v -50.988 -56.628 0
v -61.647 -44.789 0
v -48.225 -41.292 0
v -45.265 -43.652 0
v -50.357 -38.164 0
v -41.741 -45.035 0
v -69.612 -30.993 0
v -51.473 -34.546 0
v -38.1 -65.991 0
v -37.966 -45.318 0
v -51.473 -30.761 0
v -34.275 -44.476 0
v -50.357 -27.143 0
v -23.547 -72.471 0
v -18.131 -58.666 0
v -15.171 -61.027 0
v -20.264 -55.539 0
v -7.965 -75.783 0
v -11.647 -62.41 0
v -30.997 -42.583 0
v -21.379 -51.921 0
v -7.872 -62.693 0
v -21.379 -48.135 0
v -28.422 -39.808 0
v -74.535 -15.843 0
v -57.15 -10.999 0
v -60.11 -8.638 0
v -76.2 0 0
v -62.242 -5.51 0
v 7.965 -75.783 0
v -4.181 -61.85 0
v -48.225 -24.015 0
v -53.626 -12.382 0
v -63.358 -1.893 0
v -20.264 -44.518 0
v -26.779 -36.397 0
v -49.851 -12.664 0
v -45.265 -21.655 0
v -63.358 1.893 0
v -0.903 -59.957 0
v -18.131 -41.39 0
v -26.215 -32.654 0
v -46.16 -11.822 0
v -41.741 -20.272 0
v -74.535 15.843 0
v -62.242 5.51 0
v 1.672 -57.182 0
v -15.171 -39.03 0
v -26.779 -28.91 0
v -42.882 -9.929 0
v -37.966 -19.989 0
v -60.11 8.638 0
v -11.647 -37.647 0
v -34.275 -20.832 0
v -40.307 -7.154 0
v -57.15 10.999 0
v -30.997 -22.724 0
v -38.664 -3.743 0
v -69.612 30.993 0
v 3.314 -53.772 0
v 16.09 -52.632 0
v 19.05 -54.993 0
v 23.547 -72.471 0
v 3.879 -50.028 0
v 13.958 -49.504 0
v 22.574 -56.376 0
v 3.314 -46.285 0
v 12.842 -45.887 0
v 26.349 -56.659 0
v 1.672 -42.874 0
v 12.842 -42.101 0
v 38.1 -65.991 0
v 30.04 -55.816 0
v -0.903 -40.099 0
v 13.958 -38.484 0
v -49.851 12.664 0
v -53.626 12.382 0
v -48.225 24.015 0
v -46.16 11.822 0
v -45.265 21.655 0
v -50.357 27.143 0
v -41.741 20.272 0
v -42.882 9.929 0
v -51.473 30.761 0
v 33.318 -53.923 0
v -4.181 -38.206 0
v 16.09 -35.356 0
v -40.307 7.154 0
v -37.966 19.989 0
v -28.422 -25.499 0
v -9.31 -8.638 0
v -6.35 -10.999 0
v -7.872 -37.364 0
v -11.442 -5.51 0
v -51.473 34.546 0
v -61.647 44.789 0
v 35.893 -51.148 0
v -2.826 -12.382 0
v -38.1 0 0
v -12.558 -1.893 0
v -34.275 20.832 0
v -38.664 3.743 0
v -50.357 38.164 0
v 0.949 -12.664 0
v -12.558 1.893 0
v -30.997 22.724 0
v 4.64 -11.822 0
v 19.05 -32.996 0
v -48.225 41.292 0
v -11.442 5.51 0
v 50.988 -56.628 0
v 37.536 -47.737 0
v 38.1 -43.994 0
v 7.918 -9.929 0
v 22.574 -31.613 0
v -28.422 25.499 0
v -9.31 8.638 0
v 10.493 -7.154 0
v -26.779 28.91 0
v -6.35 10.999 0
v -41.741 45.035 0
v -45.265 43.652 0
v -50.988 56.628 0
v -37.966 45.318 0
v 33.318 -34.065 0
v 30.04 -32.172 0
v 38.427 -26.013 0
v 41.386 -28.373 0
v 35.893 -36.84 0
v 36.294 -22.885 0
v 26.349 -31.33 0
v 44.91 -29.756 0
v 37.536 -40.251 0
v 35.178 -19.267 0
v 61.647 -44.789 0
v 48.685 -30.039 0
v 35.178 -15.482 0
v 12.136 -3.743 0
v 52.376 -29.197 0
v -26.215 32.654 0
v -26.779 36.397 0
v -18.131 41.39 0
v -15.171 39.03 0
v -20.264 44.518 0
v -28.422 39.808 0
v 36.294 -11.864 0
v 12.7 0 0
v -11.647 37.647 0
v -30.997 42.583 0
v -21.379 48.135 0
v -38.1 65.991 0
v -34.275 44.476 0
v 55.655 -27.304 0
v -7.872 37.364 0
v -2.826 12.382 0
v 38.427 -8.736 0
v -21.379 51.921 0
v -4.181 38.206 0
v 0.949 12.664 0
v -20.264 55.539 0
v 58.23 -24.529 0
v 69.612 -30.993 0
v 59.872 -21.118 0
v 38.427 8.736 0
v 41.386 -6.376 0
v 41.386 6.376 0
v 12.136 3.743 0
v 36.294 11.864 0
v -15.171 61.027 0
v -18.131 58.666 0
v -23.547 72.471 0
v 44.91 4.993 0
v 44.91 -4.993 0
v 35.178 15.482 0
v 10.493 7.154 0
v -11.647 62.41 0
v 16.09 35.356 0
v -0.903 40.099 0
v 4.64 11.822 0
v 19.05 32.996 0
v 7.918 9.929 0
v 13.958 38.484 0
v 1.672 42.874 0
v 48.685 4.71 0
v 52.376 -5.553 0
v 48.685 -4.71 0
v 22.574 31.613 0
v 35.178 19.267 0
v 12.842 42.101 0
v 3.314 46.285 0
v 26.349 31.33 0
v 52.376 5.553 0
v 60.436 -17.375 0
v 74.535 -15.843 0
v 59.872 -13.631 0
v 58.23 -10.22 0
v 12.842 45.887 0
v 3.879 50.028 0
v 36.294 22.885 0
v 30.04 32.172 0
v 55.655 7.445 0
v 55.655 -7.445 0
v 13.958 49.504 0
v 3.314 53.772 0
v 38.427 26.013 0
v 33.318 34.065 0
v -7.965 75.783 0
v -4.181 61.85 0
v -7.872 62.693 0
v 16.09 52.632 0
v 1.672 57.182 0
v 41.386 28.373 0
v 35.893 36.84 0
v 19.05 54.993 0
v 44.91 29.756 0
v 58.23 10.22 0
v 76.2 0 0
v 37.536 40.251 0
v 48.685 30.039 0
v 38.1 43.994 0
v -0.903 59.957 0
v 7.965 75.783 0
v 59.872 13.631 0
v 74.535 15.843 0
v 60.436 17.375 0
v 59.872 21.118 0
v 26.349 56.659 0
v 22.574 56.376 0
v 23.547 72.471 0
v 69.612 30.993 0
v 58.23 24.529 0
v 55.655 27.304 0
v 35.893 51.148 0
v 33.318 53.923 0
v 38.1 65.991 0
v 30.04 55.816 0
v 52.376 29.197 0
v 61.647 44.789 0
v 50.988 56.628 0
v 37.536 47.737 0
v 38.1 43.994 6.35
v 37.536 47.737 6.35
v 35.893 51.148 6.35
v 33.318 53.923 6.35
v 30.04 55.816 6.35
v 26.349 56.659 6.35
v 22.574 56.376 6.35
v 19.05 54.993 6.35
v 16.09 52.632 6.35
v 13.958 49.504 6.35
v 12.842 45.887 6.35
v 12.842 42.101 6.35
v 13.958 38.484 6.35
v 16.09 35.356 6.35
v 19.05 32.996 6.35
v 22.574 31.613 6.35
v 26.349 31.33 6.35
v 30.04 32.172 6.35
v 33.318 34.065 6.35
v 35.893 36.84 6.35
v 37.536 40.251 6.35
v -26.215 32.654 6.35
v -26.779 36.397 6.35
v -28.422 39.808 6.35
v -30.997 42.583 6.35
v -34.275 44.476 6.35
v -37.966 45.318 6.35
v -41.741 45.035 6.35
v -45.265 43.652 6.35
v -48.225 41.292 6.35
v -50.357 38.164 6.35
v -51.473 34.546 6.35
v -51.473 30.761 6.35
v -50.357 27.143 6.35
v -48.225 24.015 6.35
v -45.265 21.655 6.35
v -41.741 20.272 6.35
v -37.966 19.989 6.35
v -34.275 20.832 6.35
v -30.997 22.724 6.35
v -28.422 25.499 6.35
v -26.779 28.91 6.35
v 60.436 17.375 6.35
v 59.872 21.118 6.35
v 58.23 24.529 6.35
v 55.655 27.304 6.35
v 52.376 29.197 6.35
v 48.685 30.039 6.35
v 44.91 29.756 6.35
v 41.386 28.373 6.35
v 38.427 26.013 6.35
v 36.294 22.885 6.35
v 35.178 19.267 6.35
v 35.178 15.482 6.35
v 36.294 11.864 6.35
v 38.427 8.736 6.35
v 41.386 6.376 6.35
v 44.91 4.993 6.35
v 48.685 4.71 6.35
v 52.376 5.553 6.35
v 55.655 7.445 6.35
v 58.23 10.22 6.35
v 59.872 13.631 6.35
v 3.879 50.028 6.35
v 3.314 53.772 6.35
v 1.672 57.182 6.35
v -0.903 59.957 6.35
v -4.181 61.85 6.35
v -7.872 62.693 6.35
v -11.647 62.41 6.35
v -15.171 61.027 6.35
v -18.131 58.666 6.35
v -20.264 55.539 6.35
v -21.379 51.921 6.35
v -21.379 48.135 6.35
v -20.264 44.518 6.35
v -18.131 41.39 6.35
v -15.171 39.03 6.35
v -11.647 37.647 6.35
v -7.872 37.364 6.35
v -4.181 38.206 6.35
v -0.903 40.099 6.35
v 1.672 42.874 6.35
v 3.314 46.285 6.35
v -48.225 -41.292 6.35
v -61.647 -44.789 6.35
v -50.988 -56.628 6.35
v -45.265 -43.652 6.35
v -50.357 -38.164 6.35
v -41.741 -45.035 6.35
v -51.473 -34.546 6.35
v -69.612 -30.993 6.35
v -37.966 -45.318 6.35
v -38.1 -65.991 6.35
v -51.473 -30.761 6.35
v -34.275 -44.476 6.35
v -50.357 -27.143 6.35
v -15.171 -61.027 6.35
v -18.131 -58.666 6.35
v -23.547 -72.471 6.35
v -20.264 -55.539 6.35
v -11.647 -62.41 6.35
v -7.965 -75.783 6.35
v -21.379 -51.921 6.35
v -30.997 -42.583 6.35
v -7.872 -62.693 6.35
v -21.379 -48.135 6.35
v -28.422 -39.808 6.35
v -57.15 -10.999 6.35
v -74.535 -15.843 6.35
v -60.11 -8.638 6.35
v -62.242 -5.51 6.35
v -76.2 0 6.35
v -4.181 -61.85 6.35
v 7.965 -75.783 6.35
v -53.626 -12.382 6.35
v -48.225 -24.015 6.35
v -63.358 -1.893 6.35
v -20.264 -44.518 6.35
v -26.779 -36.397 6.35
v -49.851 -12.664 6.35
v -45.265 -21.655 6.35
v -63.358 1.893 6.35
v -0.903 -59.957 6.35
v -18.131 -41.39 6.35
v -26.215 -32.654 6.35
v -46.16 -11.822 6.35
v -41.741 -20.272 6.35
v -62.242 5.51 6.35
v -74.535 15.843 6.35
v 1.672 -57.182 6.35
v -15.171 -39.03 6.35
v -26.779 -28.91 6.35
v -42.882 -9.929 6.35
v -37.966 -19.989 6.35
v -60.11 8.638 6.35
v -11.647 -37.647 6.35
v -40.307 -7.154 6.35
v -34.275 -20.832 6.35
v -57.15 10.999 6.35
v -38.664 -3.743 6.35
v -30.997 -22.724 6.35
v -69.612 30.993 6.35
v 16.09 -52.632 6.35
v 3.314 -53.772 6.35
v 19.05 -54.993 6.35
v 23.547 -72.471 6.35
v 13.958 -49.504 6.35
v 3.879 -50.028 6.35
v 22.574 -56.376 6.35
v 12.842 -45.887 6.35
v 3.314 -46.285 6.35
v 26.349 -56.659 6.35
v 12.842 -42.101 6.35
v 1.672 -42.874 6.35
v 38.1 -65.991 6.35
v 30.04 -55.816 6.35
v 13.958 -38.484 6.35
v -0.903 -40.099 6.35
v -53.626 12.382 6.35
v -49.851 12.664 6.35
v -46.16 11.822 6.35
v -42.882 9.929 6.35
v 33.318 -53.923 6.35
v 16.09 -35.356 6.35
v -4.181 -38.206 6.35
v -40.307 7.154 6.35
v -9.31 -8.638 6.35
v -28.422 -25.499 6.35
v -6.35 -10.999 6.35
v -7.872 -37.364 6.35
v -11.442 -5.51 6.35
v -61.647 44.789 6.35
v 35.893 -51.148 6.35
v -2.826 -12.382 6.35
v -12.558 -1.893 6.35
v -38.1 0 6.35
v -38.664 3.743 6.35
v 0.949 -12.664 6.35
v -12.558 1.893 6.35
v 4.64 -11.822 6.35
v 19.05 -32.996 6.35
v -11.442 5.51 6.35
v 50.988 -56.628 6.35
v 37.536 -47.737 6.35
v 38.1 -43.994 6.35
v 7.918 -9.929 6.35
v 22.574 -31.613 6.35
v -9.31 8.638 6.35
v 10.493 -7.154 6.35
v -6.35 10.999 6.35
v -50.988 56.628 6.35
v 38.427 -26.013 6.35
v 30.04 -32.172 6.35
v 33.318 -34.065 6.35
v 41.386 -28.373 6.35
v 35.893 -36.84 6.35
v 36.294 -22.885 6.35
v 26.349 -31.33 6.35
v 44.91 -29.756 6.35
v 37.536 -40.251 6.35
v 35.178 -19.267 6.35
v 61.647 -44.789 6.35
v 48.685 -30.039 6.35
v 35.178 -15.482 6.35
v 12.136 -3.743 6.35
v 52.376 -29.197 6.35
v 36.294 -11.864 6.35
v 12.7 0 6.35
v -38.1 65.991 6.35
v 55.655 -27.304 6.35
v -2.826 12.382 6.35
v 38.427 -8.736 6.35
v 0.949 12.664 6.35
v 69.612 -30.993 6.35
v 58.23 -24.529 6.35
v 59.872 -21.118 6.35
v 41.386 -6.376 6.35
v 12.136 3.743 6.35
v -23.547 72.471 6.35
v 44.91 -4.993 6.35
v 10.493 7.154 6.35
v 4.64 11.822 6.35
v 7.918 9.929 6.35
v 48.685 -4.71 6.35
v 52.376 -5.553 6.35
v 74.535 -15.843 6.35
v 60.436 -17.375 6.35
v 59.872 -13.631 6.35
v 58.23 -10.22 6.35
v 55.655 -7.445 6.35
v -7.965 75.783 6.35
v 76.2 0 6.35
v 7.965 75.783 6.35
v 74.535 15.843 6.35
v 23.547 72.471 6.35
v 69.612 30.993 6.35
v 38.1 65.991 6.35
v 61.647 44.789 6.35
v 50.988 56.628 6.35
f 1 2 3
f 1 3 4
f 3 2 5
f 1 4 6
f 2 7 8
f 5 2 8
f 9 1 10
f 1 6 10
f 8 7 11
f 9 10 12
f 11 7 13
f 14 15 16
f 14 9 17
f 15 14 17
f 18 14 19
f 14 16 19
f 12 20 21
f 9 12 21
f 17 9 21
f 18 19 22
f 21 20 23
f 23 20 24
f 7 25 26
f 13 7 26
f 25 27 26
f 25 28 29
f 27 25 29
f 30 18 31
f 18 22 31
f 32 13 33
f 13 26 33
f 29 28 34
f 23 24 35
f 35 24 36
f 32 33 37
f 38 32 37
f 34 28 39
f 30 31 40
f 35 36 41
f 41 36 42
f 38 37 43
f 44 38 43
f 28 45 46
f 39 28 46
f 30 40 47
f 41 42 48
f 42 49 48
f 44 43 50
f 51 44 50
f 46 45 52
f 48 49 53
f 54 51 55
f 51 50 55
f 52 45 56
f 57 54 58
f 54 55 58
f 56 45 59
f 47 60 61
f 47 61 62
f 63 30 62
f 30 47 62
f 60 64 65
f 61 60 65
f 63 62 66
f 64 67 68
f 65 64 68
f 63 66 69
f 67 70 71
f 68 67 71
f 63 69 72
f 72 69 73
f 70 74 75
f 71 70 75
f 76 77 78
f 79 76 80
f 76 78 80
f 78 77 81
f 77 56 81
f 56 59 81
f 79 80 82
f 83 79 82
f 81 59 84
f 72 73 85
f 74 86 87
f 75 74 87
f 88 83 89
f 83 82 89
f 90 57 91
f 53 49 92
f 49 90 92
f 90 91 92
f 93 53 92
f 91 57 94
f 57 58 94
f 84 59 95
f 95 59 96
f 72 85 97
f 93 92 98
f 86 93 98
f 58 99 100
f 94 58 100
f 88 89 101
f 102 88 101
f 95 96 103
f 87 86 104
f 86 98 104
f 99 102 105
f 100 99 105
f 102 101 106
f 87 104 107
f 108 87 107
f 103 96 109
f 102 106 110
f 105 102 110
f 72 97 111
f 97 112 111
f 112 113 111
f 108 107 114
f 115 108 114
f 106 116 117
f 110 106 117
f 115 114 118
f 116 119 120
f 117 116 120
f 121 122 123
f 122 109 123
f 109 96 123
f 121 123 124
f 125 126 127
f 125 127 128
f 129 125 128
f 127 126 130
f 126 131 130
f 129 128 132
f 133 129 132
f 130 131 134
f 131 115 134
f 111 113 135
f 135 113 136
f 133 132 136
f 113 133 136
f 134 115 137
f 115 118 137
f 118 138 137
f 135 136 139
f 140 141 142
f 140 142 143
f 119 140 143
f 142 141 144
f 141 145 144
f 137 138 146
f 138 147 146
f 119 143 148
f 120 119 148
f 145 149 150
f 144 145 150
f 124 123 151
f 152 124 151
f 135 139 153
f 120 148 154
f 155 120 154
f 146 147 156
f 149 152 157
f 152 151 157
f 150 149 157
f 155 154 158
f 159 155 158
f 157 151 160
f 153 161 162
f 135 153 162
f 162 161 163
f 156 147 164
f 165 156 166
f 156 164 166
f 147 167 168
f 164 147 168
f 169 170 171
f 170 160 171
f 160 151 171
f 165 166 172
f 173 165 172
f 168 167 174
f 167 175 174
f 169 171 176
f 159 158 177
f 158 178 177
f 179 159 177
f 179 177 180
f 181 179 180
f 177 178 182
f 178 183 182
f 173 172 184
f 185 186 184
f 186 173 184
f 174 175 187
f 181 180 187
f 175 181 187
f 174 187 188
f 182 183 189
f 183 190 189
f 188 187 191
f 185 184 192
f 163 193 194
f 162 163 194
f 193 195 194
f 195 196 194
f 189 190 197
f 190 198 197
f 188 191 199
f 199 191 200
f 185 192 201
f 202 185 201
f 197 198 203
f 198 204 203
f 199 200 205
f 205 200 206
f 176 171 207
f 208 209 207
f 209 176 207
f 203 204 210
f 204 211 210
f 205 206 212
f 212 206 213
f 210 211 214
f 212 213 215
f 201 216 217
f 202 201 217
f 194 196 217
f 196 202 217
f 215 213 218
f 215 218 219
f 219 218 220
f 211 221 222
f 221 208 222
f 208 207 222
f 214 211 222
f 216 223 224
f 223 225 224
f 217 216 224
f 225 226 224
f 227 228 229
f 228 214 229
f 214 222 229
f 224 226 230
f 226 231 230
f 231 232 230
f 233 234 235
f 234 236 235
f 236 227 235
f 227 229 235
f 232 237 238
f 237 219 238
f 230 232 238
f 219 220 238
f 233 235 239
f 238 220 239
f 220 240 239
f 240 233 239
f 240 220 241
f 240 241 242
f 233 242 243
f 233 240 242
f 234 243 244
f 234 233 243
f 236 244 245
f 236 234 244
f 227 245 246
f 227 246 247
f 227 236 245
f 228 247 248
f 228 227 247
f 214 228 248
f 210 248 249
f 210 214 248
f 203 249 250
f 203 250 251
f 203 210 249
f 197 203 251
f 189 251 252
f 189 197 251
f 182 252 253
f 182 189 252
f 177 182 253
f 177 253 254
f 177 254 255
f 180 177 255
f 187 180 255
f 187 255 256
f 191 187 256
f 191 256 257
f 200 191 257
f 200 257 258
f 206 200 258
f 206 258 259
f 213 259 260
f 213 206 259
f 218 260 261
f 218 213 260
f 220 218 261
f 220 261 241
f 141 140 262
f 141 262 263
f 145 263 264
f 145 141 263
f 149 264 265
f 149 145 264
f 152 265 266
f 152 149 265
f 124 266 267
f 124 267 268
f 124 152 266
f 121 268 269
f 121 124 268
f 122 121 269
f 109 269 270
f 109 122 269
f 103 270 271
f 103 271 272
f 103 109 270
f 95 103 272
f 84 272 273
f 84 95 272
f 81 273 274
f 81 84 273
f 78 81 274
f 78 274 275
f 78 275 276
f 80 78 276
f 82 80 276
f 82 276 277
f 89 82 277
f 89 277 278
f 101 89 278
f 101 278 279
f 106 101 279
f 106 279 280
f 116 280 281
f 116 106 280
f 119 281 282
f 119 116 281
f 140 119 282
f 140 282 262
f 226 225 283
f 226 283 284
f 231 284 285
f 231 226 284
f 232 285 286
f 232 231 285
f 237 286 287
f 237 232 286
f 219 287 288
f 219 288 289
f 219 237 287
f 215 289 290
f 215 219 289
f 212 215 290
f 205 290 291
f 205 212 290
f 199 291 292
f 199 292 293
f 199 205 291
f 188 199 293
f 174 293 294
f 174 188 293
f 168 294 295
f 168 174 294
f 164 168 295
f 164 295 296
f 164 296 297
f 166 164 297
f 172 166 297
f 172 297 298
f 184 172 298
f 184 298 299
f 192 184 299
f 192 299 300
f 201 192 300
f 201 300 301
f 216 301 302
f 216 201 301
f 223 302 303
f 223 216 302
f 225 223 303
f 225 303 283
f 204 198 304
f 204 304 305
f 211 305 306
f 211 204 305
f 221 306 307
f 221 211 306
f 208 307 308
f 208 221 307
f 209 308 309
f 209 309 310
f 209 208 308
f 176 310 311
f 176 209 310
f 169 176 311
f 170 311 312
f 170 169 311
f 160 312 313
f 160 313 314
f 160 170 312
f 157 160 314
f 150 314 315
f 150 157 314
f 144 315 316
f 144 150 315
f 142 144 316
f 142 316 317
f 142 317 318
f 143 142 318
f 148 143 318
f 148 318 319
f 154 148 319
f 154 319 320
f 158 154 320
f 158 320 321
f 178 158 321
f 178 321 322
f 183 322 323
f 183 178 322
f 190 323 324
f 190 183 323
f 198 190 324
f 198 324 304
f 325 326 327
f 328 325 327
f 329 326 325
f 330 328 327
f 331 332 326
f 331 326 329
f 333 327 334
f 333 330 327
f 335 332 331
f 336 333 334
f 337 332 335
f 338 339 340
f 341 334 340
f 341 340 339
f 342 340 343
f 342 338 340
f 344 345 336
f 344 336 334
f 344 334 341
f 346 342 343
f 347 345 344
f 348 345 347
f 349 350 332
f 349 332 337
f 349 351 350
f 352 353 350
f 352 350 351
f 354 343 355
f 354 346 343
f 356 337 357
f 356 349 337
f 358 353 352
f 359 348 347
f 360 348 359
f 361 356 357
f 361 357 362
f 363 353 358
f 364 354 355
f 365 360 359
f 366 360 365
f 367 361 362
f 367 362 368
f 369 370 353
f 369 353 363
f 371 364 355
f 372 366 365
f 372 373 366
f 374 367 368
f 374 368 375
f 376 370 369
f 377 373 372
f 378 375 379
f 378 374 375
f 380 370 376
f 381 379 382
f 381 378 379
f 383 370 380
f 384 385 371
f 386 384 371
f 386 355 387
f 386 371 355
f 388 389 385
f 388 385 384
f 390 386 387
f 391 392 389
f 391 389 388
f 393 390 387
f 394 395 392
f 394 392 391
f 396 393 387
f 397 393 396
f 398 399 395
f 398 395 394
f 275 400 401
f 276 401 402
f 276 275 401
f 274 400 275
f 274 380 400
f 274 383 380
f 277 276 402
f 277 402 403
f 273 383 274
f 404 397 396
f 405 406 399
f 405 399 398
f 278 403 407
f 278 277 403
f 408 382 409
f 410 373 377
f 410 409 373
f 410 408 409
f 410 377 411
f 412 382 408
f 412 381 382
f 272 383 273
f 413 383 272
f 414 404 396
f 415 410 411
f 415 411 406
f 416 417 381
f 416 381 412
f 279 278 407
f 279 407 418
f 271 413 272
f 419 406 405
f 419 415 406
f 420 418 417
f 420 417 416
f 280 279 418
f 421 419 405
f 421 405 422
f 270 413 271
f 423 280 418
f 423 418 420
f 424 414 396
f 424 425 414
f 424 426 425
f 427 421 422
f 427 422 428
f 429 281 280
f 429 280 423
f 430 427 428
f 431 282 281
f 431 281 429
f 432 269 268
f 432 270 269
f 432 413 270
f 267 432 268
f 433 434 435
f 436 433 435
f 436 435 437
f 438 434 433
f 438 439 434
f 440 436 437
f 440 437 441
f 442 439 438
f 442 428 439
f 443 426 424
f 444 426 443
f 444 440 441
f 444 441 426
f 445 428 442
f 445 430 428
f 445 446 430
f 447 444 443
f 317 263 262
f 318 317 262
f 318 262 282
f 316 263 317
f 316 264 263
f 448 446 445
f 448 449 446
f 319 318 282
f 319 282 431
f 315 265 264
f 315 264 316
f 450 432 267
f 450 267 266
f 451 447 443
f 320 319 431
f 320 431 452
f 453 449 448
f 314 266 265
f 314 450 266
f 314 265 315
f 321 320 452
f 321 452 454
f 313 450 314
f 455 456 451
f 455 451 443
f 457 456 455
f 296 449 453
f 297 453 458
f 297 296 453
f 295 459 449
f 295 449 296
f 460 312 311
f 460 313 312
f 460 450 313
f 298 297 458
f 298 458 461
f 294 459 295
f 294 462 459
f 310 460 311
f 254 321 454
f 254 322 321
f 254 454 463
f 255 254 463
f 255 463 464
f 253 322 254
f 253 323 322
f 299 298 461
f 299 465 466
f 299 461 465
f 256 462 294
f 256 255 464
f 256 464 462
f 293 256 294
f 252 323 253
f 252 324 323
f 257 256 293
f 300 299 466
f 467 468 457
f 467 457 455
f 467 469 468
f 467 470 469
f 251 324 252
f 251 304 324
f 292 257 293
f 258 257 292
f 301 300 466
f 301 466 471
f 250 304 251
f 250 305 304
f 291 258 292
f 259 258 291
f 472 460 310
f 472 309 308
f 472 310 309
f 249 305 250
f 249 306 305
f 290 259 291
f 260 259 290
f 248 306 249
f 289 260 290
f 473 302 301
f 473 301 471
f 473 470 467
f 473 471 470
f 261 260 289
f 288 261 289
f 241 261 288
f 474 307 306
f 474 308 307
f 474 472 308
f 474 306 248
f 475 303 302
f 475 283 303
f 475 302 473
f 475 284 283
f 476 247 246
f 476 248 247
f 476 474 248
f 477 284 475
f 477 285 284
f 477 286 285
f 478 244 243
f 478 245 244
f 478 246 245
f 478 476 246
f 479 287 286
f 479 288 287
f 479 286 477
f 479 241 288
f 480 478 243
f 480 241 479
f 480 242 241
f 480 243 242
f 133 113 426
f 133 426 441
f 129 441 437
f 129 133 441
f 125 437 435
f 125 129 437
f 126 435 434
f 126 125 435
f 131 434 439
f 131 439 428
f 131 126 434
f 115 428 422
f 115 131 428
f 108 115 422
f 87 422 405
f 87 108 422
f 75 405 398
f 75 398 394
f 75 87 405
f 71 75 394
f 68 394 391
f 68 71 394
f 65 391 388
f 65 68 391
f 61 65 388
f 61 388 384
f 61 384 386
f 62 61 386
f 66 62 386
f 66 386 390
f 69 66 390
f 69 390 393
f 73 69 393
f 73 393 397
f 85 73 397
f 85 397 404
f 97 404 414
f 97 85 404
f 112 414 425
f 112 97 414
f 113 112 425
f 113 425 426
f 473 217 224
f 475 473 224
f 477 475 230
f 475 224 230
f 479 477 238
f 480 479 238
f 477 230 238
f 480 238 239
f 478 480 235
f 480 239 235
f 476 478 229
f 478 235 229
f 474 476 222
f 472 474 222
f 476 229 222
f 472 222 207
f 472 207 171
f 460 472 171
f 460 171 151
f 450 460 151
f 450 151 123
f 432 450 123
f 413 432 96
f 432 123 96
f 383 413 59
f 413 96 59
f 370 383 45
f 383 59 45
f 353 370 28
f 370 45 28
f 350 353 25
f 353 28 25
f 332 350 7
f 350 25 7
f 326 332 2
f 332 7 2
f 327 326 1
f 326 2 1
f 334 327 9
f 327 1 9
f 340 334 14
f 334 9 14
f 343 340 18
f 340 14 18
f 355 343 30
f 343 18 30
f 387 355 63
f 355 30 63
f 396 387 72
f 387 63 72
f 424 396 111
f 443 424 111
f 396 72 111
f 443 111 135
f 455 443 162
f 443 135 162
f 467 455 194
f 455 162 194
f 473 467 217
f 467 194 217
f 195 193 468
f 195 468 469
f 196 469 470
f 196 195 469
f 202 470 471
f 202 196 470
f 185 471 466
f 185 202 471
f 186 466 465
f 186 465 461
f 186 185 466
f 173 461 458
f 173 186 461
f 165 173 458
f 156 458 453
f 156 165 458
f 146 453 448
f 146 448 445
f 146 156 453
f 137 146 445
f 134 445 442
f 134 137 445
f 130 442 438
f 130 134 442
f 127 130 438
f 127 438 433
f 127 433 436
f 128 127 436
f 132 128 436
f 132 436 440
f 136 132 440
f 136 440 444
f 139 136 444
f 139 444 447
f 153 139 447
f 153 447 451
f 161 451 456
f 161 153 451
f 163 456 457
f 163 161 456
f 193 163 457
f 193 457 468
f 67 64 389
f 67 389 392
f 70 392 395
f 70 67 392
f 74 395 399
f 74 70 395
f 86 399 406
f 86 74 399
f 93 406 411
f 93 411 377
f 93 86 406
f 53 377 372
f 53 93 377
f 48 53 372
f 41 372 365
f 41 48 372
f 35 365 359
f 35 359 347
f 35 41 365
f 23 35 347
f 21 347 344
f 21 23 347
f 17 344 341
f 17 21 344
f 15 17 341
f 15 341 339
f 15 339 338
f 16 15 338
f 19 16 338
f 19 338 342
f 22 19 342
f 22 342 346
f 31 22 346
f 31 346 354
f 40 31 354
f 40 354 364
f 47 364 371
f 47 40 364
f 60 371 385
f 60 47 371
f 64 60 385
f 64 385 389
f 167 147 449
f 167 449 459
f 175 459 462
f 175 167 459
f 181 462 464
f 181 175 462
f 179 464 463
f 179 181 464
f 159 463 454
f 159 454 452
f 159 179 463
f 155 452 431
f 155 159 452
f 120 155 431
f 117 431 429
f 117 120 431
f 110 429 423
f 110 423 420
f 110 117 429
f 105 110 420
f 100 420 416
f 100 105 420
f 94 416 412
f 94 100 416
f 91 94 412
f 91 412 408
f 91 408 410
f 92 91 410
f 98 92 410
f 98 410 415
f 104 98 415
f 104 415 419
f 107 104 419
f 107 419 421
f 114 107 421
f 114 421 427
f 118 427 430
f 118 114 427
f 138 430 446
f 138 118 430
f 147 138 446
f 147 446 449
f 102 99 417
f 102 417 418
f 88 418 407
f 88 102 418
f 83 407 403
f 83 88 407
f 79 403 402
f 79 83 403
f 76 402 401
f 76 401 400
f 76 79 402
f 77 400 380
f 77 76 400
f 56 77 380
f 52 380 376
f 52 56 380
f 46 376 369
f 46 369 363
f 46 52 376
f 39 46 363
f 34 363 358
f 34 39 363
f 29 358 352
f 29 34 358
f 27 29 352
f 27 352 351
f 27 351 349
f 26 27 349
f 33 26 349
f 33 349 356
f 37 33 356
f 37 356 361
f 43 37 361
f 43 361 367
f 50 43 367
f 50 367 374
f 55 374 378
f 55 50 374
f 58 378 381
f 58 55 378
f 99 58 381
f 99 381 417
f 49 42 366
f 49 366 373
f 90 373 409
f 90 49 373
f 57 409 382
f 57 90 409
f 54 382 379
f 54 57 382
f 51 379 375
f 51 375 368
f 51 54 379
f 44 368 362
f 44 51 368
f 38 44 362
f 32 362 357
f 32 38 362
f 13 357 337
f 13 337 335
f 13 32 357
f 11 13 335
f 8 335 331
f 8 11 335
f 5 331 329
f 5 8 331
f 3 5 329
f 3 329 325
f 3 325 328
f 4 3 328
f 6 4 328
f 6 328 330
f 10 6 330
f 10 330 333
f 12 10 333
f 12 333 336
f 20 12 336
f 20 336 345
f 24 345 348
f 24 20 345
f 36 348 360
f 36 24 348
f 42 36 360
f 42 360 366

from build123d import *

# Parameters (mm, degrees)
F0_R     = 76.2
F0_R_2   = 12.7
F1_DEPTH = 6.35


with BuildPart() as f1:
    # F0 (on Top) → F1 (new body)
    with BuildSketch(Plane.XY):
        Circle(F0_R)
        with Locations((-8.821327, -50.028234)):
            Circle(F0_R_2, mode=Mode.SUBTRACT)
        with Locations((-38.915058, -32.653611)):
            Circle(F0_R_2, mode=Mode.SUBTRACT)
        with Locations((25.4, -43.994091)):
            Circle(F0_R_2, mode=Mode.SUBTRACT)
        with Locations((47.736385, -17.374623)):
            Circle(F0_R_2, mode=Mode.SUBTRACT)
        with Locations((-50.8, 0)):
            Circle(F0_R_2, mode=Mode.SUBTRACT)
        with Locations((-38.915058, 32.653611)):
            Circle(F0_R_2, mode=Mode.SUBTRACT)
        with Locations((-8.821327, 50.028234)):
            Circle(F0_R_2, mode=Mode.SUBTRACT)
        Circle(F0_R_2, mode=Mode.SUBTRACT)
        with Locations((47.736385, 17.374623)):
            Circle(F0_R_2, mode=Mode.SUBTRACT)
        with Locations((25.4, 43.994091)):
            Circle(F0_R_2, mode=Mode.SUBTRACT)
    extrude(amount=F1_DEPTH)


solid = f1.part
